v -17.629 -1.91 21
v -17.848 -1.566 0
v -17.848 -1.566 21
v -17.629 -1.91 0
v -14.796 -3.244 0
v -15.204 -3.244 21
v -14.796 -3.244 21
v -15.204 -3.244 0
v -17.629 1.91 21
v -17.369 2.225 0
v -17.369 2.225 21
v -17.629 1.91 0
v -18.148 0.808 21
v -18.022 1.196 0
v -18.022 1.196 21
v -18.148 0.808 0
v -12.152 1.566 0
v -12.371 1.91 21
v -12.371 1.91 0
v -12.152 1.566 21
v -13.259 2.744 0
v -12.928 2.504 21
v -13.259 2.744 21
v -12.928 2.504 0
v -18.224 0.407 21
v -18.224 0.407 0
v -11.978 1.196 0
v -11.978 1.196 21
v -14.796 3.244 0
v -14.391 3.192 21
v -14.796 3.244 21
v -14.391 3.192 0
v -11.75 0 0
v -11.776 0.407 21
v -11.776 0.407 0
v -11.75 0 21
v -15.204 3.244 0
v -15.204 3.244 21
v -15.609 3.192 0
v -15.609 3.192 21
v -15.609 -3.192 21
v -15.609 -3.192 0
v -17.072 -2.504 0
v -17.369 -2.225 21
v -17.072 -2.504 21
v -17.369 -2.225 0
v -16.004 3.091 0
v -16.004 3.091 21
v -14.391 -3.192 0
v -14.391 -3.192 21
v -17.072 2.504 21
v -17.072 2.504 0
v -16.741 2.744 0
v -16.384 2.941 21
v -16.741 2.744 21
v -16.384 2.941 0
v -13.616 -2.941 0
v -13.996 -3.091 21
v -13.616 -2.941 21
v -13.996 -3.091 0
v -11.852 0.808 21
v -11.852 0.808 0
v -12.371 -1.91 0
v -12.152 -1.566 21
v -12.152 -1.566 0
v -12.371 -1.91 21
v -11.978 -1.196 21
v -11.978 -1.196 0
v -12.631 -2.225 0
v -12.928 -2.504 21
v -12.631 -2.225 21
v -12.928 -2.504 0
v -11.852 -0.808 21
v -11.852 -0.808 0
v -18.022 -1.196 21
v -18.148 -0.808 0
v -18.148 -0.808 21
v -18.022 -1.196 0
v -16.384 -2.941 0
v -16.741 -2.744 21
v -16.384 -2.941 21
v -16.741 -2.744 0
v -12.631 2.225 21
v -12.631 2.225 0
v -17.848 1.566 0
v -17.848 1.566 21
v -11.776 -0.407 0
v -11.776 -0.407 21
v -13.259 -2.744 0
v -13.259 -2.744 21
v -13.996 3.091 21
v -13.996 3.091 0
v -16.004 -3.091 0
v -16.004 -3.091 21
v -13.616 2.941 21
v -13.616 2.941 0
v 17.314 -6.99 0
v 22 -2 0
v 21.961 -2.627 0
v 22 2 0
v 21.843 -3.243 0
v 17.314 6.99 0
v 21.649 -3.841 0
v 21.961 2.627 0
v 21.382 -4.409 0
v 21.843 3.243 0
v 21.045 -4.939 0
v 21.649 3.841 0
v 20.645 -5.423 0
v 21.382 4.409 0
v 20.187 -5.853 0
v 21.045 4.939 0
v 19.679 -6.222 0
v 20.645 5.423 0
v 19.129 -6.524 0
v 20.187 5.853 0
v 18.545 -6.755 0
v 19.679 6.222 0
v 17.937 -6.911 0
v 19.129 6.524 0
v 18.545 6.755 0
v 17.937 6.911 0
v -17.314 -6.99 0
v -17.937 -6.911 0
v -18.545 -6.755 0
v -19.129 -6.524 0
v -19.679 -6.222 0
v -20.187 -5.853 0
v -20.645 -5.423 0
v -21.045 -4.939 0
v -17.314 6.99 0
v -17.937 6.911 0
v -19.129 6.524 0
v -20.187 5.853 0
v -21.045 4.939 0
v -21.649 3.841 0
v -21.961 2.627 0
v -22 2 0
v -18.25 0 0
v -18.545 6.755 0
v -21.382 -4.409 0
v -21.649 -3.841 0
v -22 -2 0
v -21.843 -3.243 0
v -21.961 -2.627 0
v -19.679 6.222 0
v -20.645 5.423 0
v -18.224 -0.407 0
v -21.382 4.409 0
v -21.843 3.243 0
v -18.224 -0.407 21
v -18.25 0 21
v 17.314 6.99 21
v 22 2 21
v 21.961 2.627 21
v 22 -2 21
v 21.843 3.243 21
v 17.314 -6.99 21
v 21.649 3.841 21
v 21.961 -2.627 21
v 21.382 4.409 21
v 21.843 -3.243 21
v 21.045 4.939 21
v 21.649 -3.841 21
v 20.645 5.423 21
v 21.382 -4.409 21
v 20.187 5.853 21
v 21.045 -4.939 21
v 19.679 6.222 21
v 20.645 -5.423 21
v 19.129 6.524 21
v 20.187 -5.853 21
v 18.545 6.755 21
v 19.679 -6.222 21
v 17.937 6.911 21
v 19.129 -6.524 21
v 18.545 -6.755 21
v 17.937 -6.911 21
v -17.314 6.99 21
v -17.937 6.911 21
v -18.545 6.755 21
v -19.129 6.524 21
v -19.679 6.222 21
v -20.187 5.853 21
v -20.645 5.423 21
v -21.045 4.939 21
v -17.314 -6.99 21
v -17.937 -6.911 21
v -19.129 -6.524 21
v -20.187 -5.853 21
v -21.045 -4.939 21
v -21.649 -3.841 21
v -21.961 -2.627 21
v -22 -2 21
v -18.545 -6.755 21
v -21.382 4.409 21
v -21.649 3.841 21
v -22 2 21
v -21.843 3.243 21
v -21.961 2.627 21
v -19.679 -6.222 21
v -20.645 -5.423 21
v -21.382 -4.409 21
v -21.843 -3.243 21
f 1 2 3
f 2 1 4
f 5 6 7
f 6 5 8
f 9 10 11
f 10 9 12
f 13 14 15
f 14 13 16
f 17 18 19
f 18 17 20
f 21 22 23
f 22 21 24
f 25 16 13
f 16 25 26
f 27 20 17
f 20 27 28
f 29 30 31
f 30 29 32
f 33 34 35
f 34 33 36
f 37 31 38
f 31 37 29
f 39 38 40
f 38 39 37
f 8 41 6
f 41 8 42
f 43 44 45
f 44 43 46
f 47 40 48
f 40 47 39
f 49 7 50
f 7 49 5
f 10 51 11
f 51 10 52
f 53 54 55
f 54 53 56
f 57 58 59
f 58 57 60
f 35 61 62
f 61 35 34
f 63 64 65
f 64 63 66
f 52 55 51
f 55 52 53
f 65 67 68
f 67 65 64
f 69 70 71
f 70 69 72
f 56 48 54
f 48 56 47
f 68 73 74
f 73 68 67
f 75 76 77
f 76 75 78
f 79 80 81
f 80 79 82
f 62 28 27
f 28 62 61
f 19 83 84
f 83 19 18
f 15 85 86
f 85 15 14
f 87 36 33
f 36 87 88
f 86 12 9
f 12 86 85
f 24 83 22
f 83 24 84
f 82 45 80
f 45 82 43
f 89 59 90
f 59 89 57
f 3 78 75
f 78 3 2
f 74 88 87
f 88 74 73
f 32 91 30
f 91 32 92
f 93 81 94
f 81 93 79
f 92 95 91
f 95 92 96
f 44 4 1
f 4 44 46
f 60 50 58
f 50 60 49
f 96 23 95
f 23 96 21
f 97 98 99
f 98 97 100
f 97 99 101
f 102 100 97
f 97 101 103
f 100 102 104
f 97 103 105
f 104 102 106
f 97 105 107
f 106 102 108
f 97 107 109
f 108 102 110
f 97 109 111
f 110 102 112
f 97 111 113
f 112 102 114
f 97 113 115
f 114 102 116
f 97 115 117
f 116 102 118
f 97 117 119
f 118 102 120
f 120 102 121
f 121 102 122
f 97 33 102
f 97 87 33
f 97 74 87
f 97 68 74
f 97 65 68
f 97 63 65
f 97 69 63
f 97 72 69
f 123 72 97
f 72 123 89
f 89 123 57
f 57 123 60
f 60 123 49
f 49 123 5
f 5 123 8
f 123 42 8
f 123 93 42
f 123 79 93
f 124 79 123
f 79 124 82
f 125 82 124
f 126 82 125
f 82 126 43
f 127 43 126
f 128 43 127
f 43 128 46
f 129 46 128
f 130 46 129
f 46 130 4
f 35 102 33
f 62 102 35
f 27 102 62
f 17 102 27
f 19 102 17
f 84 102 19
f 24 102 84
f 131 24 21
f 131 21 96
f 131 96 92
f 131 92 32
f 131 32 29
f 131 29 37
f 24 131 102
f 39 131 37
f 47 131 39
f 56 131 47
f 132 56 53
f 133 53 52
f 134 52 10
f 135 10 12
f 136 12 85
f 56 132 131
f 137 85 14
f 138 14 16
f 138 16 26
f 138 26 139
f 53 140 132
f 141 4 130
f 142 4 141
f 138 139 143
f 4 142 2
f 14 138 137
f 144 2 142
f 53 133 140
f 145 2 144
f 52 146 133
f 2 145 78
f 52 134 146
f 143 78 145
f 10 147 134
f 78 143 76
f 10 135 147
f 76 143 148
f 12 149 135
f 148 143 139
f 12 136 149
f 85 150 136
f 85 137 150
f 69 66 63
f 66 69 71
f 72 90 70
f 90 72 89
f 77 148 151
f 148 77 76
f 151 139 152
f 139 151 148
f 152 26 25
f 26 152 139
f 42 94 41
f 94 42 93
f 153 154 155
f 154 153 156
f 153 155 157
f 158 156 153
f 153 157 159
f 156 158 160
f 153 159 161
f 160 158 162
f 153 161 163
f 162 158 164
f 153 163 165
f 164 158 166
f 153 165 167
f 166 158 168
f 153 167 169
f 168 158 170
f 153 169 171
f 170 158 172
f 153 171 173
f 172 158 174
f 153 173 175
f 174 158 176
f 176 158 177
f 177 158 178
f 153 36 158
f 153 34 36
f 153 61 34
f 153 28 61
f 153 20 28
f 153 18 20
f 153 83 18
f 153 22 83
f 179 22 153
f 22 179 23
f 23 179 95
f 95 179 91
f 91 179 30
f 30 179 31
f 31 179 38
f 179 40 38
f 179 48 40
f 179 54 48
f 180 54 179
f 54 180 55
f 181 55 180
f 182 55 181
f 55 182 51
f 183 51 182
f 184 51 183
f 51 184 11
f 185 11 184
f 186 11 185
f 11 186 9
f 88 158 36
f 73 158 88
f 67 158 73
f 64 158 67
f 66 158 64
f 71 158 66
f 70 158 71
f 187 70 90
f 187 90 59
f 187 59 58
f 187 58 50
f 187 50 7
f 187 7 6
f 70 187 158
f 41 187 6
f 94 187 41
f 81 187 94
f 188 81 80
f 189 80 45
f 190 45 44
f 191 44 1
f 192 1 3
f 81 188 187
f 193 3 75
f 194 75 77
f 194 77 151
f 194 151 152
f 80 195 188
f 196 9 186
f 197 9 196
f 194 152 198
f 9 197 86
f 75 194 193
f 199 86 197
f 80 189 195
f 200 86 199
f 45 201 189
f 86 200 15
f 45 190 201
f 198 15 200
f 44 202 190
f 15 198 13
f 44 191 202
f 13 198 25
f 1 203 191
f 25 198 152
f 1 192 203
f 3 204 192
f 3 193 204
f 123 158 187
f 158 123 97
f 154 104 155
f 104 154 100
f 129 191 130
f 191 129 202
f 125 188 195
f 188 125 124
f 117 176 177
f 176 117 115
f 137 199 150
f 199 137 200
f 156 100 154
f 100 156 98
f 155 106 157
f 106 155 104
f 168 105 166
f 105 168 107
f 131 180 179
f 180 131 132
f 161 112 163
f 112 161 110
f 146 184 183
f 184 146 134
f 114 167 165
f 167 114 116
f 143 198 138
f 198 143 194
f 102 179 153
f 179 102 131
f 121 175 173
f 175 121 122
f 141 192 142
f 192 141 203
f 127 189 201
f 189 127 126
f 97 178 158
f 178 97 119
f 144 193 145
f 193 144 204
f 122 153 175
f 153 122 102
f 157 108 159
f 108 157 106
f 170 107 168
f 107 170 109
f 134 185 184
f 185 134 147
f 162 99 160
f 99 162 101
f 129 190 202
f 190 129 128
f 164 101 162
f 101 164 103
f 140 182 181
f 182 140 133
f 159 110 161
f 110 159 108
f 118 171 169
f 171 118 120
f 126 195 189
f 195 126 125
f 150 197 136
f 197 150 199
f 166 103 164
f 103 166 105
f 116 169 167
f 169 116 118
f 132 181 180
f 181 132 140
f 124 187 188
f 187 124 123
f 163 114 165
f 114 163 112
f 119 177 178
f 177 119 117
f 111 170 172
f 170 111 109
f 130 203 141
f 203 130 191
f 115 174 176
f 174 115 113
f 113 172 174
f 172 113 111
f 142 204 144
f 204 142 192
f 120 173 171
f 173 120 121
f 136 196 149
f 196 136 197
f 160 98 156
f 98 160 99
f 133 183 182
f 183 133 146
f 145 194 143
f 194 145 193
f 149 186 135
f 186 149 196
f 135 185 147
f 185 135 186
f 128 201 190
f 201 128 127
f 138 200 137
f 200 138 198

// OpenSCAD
$fn = 50;


difference() {
	union() {
		hull() {
			translate(v = [-17.0000000000, 2.0000000000, 0]) {
				cylinder(h = 21, r = 5);
			}
			translate(v = [17.0000000000, 2.0000000000, 0]) {
				cylinder(h = 21, r = 5);
			}
			translate(v = [-17.0000000000, -2.0000000000, 0]) {
				cylinder(h = 21, r = 5);
			}
			translate(v = [17.0000000000, -2.0000000000, 0]) {
				cylinder(h = 21, r = 5);
			}
		}
	}
	union() {
		translate(v = [-15.0000000000, 0.0000000000, 0]) {
			cylinder(h = 21, r = 3.2500000000);
		}
		translate(v = [-15.0000000000, 0.0000000000, 0]) {
			cylinder(h = 21, r = 1.8000000000);
		}
		translate(v = [-15.0000000000, 0.0000000000, 0]) {
			cylinder(h = 21, r = 1.8000000000);
		}
		translate(v = [-15.0000000000, 0.0000000000, 0]) {
			cylinder(h = 21, r = 1.8000000000);
		}
	}
}
